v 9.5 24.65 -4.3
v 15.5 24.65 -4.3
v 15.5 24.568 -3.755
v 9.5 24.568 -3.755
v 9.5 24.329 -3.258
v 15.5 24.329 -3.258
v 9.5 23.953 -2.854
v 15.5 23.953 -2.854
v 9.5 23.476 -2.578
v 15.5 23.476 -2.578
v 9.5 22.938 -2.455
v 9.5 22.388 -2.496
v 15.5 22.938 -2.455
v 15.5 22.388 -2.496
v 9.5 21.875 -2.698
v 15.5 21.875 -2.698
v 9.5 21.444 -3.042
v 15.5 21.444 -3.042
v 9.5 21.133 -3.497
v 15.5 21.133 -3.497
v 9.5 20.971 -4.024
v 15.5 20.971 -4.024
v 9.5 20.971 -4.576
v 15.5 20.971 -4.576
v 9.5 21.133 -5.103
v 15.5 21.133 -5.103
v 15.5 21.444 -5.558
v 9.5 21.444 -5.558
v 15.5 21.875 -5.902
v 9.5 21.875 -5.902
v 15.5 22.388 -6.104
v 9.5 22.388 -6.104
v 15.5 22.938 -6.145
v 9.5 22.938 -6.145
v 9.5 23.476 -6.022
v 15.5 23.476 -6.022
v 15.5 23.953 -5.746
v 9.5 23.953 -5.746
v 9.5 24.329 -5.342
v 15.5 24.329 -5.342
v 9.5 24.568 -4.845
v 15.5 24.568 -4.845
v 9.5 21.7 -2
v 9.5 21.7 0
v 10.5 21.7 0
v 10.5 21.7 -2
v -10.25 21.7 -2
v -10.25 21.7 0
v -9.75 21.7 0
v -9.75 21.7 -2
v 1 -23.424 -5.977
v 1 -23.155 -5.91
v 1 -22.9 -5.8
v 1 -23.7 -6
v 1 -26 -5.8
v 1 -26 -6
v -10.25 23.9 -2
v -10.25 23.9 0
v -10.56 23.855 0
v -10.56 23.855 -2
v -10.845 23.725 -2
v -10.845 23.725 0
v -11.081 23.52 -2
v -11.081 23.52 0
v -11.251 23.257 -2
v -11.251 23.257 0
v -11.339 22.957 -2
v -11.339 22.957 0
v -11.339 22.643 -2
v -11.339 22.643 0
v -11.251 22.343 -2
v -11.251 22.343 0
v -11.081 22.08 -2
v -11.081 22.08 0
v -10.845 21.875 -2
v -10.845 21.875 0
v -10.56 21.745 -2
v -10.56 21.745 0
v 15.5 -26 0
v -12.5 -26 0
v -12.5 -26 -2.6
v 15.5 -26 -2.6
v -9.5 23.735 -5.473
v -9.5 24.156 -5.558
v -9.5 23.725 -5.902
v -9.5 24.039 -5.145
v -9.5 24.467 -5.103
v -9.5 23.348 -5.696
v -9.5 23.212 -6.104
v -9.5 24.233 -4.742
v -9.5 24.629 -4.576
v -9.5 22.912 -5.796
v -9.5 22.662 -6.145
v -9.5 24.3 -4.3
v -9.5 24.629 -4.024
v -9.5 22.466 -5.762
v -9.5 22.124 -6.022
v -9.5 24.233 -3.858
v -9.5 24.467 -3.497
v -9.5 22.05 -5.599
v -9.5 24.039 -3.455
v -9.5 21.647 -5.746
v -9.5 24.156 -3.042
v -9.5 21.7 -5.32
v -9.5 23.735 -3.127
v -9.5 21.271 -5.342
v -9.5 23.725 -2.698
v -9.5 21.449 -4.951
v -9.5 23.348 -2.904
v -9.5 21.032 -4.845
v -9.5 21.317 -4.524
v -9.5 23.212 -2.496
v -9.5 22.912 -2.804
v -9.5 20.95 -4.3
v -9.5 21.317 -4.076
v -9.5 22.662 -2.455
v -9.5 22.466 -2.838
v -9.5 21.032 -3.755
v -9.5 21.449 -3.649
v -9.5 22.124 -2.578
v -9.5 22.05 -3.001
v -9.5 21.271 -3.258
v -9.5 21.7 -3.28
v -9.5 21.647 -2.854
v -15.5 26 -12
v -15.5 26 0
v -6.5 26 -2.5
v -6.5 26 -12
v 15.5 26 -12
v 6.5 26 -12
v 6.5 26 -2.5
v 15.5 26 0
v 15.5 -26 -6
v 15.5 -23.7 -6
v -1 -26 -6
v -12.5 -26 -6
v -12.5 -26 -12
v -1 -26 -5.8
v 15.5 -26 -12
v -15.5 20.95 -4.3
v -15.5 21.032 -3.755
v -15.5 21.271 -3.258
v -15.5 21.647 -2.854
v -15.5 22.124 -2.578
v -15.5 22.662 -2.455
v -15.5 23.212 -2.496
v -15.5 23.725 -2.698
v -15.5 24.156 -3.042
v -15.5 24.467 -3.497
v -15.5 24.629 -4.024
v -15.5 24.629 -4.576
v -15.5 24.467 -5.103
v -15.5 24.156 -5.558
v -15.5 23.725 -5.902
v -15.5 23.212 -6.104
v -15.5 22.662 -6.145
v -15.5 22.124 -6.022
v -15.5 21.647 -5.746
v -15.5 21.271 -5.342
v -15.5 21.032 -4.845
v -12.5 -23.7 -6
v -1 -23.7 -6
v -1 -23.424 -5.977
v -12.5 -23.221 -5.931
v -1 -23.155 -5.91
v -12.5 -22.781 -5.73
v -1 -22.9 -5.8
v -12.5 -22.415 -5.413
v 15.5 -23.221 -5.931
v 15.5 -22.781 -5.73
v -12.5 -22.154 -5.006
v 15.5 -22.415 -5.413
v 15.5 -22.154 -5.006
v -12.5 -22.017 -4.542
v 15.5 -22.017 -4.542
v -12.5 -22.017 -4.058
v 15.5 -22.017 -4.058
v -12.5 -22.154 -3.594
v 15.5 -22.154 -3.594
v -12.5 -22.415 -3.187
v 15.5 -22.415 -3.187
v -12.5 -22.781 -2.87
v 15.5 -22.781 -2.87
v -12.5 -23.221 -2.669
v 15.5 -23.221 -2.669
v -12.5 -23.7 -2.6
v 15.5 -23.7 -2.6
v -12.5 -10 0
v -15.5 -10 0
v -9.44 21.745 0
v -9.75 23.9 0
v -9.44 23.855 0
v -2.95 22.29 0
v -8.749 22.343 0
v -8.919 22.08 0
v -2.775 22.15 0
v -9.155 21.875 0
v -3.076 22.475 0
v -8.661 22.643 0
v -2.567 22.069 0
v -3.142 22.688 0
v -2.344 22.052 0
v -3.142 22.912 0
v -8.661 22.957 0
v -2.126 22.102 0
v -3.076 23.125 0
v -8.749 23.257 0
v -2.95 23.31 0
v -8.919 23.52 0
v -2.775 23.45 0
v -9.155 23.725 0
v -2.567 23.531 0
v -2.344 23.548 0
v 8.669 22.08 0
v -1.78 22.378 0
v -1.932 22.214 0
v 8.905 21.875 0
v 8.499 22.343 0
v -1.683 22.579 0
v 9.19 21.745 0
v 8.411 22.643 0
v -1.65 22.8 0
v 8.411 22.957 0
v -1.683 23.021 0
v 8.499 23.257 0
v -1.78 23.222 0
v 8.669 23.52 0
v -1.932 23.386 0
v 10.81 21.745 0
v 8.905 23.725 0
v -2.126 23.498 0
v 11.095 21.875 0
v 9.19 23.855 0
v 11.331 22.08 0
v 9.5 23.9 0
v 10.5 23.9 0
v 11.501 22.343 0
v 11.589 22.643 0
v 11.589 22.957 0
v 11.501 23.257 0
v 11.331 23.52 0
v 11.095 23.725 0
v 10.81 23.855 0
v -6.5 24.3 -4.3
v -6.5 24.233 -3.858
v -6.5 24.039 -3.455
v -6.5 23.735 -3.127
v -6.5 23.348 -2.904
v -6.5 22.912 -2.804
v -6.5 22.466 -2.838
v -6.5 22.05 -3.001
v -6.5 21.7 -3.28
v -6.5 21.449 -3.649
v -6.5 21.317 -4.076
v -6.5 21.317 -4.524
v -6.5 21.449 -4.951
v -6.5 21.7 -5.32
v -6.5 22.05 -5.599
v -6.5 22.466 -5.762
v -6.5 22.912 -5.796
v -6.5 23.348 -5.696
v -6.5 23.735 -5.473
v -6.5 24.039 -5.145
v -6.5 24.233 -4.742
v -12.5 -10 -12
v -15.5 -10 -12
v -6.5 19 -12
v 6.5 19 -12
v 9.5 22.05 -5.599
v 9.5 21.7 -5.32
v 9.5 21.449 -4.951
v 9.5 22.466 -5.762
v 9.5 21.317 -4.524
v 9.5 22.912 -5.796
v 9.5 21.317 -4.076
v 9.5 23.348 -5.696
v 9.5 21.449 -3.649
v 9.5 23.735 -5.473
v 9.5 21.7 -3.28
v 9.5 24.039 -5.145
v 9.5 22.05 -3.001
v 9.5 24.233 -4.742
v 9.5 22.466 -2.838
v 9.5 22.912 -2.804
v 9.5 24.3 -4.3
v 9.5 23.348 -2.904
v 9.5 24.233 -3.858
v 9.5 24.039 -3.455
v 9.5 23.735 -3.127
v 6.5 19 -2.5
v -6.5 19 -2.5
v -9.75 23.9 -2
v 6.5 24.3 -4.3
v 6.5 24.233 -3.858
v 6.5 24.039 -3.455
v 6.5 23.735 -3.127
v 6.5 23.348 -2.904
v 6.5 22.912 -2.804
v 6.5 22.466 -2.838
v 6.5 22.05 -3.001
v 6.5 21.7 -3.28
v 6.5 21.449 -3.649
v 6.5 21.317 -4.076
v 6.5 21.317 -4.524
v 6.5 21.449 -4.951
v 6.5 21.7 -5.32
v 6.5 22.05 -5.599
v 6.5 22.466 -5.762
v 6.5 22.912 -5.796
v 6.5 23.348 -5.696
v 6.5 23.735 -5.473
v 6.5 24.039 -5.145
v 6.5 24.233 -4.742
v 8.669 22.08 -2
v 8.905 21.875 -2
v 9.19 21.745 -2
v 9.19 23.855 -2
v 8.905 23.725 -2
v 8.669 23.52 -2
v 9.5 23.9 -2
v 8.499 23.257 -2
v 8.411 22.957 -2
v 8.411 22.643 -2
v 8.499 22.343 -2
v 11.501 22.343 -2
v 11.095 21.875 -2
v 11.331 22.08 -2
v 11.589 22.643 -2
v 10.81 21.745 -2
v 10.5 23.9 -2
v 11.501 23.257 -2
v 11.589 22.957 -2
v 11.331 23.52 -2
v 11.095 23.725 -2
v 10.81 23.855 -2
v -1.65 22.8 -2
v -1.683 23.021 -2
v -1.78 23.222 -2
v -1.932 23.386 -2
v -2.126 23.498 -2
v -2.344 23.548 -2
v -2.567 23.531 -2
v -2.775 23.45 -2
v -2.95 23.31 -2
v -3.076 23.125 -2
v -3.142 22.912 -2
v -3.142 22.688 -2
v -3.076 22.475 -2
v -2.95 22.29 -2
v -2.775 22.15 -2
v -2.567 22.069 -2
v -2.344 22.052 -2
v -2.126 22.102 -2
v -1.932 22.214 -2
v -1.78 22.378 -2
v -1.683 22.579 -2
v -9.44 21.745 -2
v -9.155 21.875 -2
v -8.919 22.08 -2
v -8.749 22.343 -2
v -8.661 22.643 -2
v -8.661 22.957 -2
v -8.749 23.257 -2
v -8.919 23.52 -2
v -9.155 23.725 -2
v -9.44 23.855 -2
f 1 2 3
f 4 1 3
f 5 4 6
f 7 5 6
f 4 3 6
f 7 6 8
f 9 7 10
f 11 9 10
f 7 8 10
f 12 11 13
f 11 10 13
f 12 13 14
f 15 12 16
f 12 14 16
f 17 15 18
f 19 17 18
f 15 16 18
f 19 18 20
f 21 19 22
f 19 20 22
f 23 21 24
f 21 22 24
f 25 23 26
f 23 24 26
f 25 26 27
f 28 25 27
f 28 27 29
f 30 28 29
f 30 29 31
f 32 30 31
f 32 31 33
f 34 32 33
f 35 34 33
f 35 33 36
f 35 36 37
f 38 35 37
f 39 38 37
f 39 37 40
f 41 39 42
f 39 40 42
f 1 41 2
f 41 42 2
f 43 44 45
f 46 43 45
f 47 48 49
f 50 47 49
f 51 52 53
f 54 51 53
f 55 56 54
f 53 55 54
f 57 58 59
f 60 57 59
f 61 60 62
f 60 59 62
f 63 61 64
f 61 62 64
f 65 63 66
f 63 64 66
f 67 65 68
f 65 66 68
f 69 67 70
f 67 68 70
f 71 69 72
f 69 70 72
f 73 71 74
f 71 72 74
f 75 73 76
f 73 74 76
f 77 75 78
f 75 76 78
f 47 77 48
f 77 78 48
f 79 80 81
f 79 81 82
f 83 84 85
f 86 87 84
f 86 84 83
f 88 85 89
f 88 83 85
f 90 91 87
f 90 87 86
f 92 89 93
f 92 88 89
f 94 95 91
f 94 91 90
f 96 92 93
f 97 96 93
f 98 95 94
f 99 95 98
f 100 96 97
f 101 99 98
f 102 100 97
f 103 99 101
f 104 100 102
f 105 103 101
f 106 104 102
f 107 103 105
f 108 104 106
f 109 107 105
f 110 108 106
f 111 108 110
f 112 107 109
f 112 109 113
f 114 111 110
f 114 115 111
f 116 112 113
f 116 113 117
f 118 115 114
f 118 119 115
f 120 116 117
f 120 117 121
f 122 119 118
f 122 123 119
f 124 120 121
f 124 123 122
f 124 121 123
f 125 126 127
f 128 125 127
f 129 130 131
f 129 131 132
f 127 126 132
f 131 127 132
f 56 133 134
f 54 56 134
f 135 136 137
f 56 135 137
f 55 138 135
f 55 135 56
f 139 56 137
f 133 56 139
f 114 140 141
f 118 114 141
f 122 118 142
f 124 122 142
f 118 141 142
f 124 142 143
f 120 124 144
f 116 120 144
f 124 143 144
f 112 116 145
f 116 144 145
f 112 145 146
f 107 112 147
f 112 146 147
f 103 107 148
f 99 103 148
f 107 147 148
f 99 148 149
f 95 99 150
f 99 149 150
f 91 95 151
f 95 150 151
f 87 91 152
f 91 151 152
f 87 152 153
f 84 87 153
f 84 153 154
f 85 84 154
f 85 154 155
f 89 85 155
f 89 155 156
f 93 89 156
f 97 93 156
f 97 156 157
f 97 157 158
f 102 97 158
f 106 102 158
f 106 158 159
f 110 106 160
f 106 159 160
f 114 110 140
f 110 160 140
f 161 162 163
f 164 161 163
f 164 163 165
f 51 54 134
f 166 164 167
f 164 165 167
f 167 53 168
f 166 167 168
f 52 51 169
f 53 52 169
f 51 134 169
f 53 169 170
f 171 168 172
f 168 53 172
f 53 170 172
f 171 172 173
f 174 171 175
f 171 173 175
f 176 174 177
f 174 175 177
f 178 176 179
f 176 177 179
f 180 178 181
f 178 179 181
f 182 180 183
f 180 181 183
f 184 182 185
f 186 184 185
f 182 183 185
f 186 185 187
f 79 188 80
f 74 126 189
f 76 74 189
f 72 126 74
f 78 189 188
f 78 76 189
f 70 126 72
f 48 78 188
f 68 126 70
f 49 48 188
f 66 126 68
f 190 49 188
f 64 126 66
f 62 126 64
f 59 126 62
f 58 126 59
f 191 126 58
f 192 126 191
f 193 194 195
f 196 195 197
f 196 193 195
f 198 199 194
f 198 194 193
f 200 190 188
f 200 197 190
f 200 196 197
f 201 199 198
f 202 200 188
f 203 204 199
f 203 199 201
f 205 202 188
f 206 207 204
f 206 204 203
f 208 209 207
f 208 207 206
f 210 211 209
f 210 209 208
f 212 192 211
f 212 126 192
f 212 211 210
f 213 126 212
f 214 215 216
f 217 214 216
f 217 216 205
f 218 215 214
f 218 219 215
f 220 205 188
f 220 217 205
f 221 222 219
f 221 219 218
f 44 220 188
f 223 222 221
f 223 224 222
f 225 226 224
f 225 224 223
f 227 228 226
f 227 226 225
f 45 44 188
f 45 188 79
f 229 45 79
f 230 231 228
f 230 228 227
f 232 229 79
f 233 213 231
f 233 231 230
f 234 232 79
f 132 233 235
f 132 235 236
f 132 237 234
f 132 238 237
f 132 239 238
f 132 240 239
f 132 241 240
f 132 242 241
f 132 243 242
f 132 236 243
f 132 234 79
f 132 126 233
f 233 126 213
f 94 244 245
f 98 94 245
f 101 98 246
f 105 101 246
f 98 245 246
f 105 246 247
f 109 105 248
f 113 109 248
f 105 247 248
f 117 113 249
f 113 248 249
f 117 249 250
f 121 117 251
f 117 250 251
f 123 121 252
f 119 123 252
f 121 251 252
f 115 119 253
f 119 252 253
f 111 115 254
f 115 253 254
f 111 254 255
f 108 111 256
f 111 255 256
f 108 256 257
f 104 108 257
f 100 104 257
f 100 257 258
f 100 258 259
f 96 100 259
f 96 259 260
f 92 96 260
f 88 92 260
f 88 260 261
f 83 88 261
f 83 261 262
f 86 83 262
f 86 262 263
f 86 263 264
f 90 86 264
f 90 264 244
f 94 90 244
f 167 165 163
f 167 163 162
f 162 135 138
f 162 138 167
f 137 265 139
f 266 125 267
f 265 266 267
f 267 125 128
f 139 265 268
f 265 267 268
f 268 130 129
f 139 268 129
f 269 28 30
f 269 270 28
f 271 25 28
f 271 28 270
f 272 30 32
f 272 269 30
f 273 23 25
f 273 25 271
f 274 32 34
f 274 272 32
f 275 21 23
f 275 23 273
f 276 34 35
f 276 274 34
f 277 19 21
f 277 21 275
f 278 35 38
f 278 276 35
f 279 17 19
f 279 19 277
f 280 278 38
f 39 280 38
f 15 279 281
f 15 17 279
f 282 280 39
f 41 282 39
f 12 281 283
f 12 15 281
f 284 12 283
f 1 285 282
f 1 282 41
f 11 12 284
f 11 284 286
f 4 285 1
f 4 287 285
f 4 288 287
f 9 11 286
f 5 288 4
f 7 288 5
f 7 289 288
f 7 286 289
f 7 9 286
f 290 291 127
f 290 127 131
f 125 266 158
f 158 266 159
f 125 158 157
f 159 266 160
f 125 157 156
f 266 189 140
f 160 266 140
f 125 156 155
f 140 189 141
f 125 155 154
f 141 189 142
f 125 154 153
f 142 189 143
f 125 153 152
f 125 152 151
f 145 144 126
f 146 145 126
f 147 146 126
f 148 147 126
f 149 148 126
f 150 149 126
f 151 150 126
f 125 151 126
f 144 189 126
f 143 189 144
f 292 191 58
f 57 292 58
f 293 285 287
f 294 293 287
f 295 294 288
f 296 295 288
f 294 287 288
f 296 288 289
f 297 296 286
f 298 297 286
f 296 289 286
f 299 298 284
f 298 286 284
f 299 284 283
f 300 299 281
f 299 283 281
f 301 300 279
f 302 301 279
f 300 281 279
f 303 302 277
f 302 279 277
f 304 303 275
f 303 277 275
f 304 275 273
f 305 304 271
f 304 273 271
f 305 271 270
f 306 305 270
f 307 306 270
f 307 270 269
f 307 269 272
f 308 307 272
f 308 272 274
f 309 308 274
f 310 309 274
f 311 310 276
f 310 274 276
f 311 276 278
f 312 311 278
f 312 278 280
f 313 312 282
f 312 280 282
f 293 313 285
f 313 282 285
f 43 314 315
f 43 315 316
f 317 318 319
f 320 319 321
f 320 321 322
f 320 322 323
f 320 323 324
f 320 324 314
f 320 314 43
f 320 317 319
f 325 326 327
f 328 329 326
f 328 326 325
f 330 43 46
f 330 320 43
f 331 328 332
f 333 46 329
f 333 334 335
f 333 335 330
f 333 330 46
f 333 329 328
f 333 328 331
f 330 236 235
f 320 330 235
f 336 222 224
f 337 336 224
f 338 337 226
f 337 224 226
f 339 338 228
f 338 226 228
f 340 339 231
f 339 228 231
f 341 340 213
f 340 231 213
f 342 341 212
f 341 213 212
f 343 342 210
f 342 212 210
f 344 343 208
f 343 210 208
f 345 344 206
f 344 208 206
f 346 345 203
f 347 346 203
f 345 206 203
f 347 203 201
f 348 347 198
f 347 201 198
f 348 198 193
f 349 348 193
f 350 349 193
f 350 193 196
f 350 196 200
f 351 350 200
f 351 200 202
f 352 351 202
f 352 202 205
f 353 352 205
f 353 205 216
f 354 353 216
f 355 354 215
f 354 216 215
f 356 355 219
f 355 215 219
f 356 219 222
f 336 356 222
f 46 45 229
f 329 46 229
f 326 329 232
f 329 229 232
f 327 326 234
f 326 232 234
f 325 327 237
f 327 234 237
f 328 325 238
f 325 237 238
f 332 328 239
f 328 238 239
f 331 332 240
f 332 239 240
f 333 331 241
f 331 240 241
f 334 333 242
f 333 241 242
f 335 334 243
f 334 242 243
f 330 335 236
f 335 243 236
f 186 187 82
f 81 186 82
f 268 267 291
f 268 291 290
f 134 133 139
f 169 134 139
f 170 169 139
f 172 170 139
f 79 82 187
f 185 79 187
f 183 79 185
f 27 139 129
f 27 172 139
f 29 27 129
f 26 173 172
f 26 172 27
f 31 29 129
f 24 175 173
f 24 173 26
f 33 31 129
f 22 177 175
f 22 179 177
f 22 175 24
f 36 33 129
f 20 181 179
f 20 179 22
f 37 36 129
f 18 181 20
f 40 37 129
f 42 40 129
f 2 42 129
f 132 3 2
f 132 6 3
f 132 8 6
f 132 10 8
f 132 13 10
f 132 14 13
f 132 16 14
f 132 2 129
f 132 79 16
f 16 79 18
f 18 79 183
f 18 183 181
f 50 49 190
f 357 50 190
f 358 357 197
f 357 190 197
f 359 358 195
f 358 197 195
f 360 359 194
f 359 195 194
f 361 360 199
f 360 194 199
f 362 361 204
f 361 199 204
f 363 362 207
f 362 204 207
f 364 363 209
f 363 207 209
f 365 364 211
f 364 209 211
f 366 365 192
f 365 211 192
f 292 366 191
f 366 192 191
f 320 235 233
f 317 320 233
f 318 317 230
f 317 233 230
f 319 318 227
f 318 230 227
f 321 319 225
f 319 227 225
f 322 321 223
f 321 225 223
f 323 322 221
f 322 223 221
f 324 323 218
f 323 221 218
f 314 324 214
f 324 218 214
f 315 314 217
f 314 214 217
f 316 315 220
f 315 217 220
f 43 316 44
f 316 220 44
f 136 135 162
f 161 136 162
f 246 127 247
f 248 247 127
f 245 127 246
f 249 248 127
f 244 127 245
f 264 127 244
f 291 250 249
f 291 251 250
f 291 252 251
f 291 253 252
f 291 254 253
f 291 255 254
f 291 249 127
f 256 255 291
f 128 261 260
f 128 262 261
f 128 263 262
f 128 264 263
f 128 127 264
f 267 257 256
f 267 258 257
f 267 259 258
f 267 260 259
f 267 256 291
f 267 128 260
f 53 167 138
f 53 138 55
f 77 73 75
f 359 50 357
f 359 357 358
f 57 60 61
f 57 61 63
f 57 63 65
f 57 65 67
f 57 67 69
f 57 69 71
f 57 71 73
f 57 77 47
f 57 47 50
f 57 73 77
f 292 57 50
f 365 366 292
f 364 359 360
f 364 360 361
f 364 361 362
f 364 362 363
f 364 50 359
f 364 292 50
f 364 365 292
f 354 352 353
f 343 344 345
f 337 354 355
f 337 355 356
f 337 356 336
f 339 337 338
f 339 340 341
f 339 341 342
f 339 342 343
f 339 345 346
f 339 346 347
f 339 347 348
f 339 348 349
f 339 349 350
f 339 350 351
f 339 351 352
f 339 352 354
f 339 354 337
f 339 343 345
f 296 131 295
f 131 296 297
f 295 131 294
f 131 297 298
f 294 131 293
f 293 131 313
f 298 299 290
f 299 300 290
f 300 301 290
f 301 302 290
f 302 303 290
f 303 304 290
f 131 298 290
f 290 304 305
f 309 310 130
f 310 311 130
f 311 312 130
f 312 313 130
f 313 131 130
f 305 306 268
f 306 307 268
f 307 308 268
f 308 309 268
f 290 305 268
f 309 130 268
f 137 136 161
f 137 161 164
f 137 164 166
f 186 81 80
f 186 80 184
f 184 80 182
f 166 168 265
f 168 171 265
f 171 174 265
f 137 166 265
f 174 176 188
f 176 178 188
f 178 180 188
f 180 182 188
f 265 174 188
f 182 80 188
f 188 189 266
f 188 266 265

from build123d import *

# Parameters (mm, degrees)
F0_W      = 31
F0_H      = 52
F1_DEPTH  = 12
F2_R      = 1.5
F3_DEPTH  = 25
F4_R      = 0.75
F5_DEPTH  = 2
F6_W      = 2
F6_H      = 0.2
F8_W      = 3
F8_H      = 16
F9_DEPTH  = 12.001
F10_W     = 13
F10_H     = 7
F11_DEPTH = 9.5
F12_R     = 1.85
F12_R_2   = 1.5
F13_DEPTH = 6
F14_R     = 1.85
F15_DEPTH = 6


with BuildPart() as f1:
    # F0 (on Top) → F1 (new body)
    with BuildSketch(Plane.XY):
        Rectangle(F0_W, F0_H)
    extrude(amount=-F1_DEPTH)

    # F2 (on Right) → F3 (cut, symmetric)
    with BuildSketch(Plane.YZ):
        with Locations((22.8, -4.3)):
            Circle(F2_R)
        with BuildLine():
            Line((-28.7, -6), (-23.7, -6))
            ThreePointArc((-23.7, -6), (-22, -4.3), (-23.7, -2.6))
            Line((-23.7, -2.6), (-28.7, -2.6))
            Line((-28.7, -2.6), (-28.7, -6))
        make_face()
    extrude(amount=F3_DEPTH, both=True, mode=Mode.SUBTRACT)

    # F4 (on face) → F5 (cut)
    with BuildSketch(Plane.XY):
        with BuildLine():
            Line((9.5, 21.7), (10.5, 21.7))
            ThreePointArc((10.5, 21.7), (11.6, 22.8), (10.5, 23.9))
            Line((10.5, 23.9), (9.5, 23.9))
            ThreePointArc((9.5, 23.9), (8.4, 22.8), (9.5, 21.7))
        make_face()
        with BuildLine():
            Line((-9.75, 23.9), (-10.25, 23.9))
            ThreePointArc((-10.25, 23.9), (-11.35, 22.8), (-10.25, 21.7))
            Line((-10.25, 21.7), (-9.75, 21.7))
            ThreePointArc((-9.75, 21.7), (-8.65, 22.8), (-9.75, 23.9))
        make_face()
        with Locations((-2.4, 22.8)):
            Circle(F4_R)
    extrude(amount=-F5_DEPTH, mode=Mode.SUBTRACT)

    # F6 (on face) → F7 (join, up to the next surface of F1)
    with BuildSketch(Plane.XZ.offset(26)):
        with Locations((0, -5.9)):
            Rectangle(F6_W, F6_H)
    extrude(until=Until.NEXT, dir=(0, 1, 0))

    # F8 (on face) → F9 (cut, through all)
    with BuildSketch(Plane.XY):
        with Locations((-14, -18)):
            Rectangle(F8_W, F8_H)
    extrude(amount=-F9_DEPTH, mode=Mode.SUBTRACT)

    # F10 (on face) → F11 (cut)
    with BuildSketch(Plane(origin=(0, 0, -12), x_dir=(1, 0, 0), z_dir=(0, 0, -1))):
        with Locations((0, -22.5)):
            Rectangle(F10_W, F10_H)
    extrude(amount=-F11_DEPTH, mode=Mode.SUBTRACT)

    # F12 (on face) → F13 (cut)
    with BuildSketch(Plane(origin=(-15.5, 0, 0), x_dir=(0, -1, 0), z_dir=(-1, 0, 0))):
        with Locations((-22.8, -4.3)):
            Circle(F12_R)
        with Locations((-22.8, -4.3)):
            Circle(F12_R_2, mode=Mode.SUBTRACT)
    extrude(amount=-F13_DEPTH, mode=Mode.SUBTRACT)

    # F14 (on face) → F15 (cut)
    with BuildSketch(Plane.YZ.offset(15.5)):
        with Locations((22.8, -4.3)):
            Circle(F14_R)
    extrude(amount=-F15_DEPTH, mode=Mode.SUBTRACT)


solid = f1.part
